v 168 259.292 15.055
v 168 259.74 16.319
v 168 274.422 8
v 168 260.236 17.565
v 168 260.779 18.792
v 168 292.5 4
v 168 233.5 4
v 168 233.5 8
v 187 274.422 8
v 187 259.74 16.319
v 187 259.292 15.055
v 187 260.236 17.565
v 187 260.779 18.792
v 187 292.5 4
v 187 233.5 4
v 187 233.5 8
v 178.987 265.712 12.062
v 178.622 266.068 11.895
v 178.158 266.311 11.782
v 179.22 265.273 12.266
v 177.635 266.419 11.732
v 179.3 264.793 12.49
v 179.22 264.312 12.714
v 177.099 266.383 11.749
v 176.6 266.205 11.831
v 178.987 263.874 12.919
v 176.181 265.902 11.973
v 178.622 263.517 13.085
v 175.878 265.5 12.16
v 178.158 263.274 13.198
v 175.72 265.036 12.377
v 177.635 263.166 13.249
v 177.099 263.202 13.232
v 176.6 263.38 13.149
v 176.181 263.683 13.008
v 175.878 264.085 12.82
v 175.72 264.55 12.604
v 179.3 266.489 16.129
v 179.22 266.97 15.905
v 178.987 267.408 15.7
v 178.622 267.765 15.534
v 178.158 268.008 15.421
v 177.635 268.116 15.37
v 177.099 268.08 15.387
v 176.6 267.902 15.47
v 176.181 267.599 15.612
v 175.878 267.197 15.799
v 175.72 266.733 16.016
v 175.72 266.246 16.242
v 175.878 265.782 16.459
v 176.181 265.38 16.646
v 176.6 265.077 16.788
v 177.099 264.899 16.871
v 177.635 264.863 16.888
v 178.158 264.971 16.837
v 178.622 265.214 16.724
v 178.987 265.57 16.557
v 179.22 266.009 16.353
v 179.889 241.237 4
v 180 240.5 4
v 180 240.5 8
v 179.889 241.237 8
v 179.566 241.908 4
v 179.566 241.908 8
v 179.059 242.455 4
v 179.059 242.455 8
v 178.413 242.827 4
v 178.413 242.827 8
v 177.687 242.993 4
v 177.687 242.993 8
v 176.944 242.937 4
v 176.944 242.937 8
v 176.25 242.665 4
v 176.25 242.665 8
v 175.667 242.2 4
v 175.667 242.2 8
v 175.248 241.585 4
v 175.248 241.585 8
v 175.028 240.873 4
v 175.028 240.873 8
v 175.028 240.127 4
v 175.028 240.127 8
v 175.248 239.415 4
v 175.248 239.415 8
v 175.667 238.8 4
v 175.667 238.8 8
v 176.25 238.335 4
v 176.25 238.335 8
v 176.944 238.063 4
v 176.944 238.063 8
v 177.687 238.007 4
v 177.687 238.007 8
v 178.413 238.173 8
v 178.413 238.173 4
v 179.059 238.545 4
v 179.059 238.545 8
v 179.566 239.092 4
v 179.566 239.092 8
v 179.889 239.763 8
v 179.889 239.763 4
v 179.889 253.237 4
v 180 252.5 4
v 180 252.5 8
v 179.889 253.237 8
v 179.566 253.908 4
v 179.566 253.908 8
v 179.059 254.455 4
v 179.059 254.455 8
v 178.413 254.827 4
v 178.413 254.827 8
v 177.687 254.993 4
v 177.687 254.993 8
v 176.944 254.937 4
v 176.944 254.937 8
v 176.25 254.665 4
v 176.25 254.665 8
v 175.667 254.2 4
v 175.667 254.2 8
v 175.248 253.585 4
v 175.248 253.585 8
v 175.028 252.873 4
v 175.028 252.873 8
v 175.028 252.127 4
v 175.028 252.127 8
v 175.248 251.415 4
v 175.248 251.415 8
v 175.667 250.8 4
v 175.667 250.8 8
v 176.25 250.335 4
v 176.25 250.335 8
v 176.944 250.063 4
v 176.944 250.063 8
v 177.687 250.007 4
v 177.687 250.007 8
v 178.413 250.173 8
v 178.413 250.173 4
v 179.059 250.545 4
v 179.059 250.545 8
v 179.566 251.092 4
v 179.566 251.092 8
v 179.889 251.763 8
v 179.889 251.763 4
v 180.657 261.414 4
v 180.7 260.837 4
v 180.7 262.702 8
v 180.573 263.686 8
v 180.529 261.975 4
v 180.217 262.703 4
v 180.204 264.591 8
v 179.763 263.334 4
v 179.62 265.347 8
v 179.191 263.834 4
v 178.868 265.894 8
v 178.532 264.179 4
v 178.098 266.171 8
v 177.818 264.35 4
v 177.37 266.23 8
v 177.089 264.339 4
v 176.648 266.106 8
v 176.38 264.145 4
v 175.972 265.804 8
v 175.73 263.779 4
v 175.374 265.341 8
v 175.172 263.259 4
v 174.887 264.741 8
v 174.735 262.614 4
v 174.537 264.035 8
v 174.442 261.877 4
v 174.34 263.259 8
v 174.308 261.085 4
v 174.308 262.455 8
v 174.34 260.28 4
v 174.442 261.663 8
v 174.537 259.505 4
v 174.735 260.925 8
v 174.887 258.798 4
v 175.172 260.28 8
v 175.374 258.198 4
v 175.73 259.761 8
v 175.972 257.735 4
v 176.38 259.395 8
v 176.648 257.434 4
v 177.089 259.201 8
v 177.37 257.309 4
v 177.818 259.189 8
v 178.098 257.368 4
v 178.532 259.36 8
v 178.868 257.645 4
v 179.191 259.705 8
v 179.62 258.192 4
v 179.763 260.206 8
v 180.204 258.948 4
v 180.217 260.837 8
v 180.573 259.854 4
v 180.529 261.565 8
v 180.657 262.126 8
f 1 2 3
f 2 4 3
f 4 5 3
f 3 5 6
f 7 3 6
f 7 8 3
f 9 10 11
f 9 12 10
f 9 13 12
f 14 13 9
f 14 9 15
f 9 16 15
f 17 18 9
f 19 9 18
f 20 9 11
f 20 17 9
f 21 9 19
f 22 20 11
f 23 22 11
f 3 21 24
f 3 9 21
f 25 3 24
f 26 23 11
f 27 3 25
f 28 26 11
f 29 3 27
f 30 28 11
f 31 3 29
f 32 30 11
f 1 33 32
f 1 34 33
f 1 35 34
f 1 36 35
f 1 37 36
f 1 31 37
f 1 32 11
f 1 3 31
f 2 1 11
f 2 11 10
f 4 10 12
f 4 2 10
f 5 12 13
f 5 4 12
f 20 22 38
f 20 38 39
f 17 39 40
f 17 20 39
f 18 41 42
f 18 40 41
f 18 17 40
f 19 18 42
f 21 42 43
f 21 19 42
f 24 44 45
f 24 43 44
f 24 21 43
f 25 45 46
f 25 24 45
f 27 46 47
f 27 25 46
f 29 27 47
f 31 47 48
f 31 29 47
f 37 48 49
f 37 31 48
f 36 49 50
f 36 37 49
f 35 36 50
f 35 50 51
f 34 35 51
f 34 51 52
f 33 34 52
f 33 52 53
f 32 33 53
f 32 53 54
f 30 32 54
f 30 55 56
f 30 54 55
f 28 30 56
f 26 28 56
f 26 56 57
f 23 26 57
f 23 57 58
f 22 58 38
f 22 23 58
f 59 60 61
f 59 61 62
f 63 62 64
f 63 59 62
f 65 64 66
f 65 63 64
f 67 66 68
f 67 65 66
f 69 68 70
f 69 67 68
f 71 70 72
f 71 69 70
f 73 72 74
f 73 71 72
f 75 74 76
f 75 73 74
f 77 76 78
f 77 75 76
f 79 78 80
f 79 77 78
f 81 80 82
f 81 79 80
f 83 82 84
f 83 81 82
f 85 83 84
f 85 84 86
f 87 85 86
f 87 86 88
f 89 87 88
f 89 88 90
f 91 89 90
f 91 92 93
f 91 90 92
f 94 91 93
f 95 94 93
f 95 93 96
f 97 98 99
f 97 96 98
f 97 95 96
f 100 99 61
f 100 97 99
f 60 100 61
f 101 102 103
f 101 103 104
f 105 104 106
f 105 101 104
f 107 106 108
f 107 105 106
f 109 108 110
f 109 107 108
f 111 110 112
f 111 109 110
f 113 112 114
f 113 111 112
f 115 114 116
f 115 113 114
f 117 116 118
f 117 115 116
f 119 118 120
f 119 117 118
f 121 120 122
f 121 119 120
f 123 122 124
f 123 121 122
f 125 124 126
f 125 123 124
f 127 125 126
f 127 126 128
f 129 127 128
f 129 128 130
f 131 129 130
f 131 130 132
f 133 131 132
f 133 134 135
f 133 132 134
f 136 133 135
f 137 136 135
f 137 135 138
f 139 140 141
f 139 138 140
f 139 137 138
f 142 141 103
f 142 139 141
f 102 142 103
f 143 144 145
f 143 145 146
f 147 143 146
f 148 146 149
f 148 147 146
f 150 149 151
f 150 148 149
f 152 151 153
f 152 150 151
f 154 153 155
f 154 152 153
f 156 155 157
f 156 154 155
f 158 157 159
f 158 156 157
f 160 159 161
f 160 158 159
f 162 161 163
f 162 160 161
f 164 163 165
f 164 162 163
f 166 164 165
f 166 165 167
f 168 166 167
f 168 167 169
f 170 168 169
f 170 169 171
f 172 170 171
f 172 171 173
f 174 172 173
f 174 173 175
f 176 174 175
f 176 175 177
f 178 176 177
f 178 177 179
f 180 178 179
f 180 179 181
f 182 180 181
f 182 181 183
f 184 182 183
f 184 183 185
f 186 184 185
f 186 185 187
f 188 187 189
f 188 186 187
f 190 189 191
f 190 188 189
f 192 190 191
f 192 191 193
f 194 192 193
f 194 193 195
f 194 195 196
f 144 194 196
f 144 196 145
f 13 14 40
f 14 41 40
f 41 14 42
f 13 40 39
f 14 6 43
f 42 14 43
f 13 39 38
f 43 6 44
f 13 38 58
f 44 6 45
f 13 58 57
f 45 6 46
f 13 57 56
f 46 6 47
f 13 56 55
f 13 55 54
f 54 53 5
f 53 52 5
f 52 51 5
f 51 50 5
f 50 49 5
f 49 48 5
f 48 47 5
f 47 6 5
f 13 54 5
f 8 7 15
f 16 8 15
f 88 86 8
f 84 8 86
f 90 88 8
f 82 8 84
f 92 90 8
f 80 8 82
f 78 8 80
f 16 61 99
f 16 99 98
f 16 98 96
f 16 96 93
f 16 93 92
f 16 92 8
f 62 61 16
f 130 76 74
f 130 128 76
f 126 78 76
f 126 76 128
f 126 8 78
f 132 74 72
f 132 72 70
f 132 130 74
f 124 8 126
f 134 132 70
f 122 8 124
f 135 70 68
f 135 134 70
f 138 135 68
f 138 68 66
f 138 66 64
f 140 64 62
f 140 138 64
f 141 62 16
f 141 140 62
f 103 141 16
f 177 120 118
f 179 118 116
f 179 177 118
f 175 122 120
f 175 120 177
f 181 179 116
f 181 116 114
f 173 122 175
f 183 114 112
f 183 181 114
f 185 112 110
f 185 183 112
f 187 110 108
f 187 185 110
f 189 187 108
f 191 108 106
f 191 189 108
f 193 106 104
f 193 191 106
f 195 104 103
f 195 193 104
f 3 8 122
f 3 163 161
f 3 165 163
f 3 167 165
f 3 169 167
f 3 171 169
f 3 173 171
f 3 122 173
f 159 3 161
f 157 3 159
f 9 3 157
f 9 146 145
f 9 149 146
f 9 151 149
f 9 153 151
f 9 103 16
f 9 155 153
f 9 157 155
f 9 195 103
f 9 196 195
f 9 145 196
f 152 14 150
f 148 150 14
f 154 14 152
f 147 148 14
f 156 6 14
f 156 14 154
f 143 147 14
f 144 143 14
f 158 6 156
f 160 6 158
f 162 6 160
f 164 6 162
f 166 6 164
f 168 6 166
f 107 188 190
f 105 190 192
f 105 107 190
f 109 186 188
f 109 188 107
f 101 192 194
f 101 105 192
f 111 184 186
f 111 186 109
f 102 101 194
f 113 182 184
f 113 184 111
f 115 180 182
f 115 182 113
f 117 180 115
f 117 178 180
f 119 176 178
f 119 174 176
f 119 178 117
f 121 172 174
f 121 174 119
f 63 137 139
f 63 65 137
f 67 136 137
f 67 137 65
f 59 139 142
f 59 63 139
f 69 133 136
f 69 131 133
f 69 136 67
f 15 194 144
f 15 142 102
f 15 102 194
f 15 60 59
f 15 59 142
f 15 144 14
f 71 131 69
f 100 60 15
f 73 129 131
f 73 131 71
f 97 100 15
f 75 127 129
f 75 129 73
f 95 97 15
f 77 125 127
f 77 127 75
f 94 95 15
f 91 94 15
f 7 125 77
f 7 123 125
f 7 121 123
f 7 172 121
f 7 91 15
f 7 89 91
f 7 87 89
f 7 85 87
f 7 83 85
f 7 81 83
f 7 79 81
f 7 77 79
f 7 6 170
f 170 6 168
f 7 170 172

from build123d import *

# Parameters (mm, degrees)
CYLINDER077_R               = 3.2
CYLINDER077_DEPTH           = 10
CYLINDER077_PLACEMENT_ANGLE = 25
CYLINDER012_R               = 1.8
CYLINDER012_DEPTH           = 15
CYLINDER012_PLACEMENT_ANGLE = 25
CYLINDER023_R               = 2.5
CYLINDER023_DEPTH           = 10
CYLINDER020_R               = 2.5
CYLINDER020_DEPTH           = 10
CYLINDER021_W               = 35
CYLINDER021_H               = 19
CYLINDER021_ANGLE           = 25
CYLINDER022_W               = 35
CYLINDER022_H               = 19
CYLINDER022_ANGLE           = 25
BOX029_W                    = 19
BOX029_H                    = 50
BOX029_DEPTH                = 4


with BuildPart() as cylinder073:
    # Cylinder077 → Cylinder077 (new body)
    with BuildSketch(Plane.XY):
        Circle(CYLINDER077_R)
    extrude(amount=CYLINDER077_DEPTH)


with BuildPart() as cylinder073_1:
    # Cylinder077 placement: moved
    add(cylinder073.part.moved(Location((177.5, 259.740915, 1.649137))).rotate(Axis((177.5, 259.740915, 1.649137), (-1, 0, 0)), CYLINDER077_PLACEMENT_ANGLE))


with BuildPart() as m2bolt:
    # Cylinder012 → Cylinder012 (new body)
    with BuildSketch(Plane.XY):
        Circle(CYLINDER012_R)
    extrude(amount=CYLINDER012_DEPTH)


with BuildPart() as m2bolt_1:
    # Cylinder012 placement: moved
    add(m2bolt.part.moved(Location((177.5, 263.58, 9.88971))).rotate(Axis((177.5, 263.58, 9.88971), (-1, 0, 0)), CYLINDER012_PLACEMENT_ANGLE))


with BuildPart() as m4s005:
    # Cylinder023 → Cylinder023 (new body)
    with BuildSketch(Plane(origin=(177.5, 240.5, 0), x_dir=(1, 0, 0), z_dir=(0, 0, 1))):
        Circle(CYLINDER023_R)
    extrude(amount=CYLINDER023_DEPTH)


with BuildPart() as m4lowcut002:
    # Cylinder020 → Cylinder020 (new body)
    with BuildSketch(Plane(origin=(177.5, 252.5, 0), x_dir=(1, 0, 0), z_dir=(0, 0, 1))):
        Circle(CYLINDER020_R)
    extrude(amount=CYLINDER020_DEPTH)

    # Fusion011: union m4s005
    add(m4s005.part)


with BuildPart() as cylinder021:
    # Cylinder021 → Cylinder021 (revolve)
    with BuildSketch(Plane(origin=(187, 283, 4), x_dir=(0, -1, 0), z_dir=(0, 0, -1))):
        with Locations((17.5, 9.5)):
            Rectangle(CYLINDER021_W, CYLINDER021_H)
    revolve(axis=Axis((187, 283, 4), (-1, 0, 0)), revolution_arc=CYLINDER021_ANGLE)


with BuildPart() as bottom004:
    # Cylinder022 → Cylinder022 (revolve)
    with BuildSketch(Plane(origin=(187, 292.5, 4), x_dir=(0, -1, 0), z_dir=(0, 0, -1))):
        with Locations((17.5, 9.5)):
            Rectangle(CYLINDER022_W, CYLINDER022_H)
    revolve(axis=Axis((187, 292.5, 4), (-1, 0, 0)), revolution_arc=CYLINDER022_ANGLE)

    # Cut018: cut Cylinder021
    add(cylinder021.part, mode=Mode.SUBTRACT)


with BuildPart() as bottommid001:
    # Box029 → Box029 (new body)
    with BuildSketch(Plane(origin=(168, 233.5, 4), x_dir=(1, 0, 0), z_dir=(0, 0, 1))):
        with Locations((9.5, 25)):
            Rectangle(BOX029_W, BOX029_H)
    extrude(amount=BOX029_DEPTH)

    # Fusion012: union bottom004
    add(bottom004.part)

    # Cut019: cut m4lowCut002
    add(m4lowcut002.part, mode=Mode.SUBTRACT)

    # Cut029: cut m2Bolt
    add(m2bolt_1.part, mode=Mode.SUBTRACT)

    # Cut060: cut Cylinder073
    add(cylinder073_1.part, mode=Mode.SUBTRACT)


solid = bottommid001.part
